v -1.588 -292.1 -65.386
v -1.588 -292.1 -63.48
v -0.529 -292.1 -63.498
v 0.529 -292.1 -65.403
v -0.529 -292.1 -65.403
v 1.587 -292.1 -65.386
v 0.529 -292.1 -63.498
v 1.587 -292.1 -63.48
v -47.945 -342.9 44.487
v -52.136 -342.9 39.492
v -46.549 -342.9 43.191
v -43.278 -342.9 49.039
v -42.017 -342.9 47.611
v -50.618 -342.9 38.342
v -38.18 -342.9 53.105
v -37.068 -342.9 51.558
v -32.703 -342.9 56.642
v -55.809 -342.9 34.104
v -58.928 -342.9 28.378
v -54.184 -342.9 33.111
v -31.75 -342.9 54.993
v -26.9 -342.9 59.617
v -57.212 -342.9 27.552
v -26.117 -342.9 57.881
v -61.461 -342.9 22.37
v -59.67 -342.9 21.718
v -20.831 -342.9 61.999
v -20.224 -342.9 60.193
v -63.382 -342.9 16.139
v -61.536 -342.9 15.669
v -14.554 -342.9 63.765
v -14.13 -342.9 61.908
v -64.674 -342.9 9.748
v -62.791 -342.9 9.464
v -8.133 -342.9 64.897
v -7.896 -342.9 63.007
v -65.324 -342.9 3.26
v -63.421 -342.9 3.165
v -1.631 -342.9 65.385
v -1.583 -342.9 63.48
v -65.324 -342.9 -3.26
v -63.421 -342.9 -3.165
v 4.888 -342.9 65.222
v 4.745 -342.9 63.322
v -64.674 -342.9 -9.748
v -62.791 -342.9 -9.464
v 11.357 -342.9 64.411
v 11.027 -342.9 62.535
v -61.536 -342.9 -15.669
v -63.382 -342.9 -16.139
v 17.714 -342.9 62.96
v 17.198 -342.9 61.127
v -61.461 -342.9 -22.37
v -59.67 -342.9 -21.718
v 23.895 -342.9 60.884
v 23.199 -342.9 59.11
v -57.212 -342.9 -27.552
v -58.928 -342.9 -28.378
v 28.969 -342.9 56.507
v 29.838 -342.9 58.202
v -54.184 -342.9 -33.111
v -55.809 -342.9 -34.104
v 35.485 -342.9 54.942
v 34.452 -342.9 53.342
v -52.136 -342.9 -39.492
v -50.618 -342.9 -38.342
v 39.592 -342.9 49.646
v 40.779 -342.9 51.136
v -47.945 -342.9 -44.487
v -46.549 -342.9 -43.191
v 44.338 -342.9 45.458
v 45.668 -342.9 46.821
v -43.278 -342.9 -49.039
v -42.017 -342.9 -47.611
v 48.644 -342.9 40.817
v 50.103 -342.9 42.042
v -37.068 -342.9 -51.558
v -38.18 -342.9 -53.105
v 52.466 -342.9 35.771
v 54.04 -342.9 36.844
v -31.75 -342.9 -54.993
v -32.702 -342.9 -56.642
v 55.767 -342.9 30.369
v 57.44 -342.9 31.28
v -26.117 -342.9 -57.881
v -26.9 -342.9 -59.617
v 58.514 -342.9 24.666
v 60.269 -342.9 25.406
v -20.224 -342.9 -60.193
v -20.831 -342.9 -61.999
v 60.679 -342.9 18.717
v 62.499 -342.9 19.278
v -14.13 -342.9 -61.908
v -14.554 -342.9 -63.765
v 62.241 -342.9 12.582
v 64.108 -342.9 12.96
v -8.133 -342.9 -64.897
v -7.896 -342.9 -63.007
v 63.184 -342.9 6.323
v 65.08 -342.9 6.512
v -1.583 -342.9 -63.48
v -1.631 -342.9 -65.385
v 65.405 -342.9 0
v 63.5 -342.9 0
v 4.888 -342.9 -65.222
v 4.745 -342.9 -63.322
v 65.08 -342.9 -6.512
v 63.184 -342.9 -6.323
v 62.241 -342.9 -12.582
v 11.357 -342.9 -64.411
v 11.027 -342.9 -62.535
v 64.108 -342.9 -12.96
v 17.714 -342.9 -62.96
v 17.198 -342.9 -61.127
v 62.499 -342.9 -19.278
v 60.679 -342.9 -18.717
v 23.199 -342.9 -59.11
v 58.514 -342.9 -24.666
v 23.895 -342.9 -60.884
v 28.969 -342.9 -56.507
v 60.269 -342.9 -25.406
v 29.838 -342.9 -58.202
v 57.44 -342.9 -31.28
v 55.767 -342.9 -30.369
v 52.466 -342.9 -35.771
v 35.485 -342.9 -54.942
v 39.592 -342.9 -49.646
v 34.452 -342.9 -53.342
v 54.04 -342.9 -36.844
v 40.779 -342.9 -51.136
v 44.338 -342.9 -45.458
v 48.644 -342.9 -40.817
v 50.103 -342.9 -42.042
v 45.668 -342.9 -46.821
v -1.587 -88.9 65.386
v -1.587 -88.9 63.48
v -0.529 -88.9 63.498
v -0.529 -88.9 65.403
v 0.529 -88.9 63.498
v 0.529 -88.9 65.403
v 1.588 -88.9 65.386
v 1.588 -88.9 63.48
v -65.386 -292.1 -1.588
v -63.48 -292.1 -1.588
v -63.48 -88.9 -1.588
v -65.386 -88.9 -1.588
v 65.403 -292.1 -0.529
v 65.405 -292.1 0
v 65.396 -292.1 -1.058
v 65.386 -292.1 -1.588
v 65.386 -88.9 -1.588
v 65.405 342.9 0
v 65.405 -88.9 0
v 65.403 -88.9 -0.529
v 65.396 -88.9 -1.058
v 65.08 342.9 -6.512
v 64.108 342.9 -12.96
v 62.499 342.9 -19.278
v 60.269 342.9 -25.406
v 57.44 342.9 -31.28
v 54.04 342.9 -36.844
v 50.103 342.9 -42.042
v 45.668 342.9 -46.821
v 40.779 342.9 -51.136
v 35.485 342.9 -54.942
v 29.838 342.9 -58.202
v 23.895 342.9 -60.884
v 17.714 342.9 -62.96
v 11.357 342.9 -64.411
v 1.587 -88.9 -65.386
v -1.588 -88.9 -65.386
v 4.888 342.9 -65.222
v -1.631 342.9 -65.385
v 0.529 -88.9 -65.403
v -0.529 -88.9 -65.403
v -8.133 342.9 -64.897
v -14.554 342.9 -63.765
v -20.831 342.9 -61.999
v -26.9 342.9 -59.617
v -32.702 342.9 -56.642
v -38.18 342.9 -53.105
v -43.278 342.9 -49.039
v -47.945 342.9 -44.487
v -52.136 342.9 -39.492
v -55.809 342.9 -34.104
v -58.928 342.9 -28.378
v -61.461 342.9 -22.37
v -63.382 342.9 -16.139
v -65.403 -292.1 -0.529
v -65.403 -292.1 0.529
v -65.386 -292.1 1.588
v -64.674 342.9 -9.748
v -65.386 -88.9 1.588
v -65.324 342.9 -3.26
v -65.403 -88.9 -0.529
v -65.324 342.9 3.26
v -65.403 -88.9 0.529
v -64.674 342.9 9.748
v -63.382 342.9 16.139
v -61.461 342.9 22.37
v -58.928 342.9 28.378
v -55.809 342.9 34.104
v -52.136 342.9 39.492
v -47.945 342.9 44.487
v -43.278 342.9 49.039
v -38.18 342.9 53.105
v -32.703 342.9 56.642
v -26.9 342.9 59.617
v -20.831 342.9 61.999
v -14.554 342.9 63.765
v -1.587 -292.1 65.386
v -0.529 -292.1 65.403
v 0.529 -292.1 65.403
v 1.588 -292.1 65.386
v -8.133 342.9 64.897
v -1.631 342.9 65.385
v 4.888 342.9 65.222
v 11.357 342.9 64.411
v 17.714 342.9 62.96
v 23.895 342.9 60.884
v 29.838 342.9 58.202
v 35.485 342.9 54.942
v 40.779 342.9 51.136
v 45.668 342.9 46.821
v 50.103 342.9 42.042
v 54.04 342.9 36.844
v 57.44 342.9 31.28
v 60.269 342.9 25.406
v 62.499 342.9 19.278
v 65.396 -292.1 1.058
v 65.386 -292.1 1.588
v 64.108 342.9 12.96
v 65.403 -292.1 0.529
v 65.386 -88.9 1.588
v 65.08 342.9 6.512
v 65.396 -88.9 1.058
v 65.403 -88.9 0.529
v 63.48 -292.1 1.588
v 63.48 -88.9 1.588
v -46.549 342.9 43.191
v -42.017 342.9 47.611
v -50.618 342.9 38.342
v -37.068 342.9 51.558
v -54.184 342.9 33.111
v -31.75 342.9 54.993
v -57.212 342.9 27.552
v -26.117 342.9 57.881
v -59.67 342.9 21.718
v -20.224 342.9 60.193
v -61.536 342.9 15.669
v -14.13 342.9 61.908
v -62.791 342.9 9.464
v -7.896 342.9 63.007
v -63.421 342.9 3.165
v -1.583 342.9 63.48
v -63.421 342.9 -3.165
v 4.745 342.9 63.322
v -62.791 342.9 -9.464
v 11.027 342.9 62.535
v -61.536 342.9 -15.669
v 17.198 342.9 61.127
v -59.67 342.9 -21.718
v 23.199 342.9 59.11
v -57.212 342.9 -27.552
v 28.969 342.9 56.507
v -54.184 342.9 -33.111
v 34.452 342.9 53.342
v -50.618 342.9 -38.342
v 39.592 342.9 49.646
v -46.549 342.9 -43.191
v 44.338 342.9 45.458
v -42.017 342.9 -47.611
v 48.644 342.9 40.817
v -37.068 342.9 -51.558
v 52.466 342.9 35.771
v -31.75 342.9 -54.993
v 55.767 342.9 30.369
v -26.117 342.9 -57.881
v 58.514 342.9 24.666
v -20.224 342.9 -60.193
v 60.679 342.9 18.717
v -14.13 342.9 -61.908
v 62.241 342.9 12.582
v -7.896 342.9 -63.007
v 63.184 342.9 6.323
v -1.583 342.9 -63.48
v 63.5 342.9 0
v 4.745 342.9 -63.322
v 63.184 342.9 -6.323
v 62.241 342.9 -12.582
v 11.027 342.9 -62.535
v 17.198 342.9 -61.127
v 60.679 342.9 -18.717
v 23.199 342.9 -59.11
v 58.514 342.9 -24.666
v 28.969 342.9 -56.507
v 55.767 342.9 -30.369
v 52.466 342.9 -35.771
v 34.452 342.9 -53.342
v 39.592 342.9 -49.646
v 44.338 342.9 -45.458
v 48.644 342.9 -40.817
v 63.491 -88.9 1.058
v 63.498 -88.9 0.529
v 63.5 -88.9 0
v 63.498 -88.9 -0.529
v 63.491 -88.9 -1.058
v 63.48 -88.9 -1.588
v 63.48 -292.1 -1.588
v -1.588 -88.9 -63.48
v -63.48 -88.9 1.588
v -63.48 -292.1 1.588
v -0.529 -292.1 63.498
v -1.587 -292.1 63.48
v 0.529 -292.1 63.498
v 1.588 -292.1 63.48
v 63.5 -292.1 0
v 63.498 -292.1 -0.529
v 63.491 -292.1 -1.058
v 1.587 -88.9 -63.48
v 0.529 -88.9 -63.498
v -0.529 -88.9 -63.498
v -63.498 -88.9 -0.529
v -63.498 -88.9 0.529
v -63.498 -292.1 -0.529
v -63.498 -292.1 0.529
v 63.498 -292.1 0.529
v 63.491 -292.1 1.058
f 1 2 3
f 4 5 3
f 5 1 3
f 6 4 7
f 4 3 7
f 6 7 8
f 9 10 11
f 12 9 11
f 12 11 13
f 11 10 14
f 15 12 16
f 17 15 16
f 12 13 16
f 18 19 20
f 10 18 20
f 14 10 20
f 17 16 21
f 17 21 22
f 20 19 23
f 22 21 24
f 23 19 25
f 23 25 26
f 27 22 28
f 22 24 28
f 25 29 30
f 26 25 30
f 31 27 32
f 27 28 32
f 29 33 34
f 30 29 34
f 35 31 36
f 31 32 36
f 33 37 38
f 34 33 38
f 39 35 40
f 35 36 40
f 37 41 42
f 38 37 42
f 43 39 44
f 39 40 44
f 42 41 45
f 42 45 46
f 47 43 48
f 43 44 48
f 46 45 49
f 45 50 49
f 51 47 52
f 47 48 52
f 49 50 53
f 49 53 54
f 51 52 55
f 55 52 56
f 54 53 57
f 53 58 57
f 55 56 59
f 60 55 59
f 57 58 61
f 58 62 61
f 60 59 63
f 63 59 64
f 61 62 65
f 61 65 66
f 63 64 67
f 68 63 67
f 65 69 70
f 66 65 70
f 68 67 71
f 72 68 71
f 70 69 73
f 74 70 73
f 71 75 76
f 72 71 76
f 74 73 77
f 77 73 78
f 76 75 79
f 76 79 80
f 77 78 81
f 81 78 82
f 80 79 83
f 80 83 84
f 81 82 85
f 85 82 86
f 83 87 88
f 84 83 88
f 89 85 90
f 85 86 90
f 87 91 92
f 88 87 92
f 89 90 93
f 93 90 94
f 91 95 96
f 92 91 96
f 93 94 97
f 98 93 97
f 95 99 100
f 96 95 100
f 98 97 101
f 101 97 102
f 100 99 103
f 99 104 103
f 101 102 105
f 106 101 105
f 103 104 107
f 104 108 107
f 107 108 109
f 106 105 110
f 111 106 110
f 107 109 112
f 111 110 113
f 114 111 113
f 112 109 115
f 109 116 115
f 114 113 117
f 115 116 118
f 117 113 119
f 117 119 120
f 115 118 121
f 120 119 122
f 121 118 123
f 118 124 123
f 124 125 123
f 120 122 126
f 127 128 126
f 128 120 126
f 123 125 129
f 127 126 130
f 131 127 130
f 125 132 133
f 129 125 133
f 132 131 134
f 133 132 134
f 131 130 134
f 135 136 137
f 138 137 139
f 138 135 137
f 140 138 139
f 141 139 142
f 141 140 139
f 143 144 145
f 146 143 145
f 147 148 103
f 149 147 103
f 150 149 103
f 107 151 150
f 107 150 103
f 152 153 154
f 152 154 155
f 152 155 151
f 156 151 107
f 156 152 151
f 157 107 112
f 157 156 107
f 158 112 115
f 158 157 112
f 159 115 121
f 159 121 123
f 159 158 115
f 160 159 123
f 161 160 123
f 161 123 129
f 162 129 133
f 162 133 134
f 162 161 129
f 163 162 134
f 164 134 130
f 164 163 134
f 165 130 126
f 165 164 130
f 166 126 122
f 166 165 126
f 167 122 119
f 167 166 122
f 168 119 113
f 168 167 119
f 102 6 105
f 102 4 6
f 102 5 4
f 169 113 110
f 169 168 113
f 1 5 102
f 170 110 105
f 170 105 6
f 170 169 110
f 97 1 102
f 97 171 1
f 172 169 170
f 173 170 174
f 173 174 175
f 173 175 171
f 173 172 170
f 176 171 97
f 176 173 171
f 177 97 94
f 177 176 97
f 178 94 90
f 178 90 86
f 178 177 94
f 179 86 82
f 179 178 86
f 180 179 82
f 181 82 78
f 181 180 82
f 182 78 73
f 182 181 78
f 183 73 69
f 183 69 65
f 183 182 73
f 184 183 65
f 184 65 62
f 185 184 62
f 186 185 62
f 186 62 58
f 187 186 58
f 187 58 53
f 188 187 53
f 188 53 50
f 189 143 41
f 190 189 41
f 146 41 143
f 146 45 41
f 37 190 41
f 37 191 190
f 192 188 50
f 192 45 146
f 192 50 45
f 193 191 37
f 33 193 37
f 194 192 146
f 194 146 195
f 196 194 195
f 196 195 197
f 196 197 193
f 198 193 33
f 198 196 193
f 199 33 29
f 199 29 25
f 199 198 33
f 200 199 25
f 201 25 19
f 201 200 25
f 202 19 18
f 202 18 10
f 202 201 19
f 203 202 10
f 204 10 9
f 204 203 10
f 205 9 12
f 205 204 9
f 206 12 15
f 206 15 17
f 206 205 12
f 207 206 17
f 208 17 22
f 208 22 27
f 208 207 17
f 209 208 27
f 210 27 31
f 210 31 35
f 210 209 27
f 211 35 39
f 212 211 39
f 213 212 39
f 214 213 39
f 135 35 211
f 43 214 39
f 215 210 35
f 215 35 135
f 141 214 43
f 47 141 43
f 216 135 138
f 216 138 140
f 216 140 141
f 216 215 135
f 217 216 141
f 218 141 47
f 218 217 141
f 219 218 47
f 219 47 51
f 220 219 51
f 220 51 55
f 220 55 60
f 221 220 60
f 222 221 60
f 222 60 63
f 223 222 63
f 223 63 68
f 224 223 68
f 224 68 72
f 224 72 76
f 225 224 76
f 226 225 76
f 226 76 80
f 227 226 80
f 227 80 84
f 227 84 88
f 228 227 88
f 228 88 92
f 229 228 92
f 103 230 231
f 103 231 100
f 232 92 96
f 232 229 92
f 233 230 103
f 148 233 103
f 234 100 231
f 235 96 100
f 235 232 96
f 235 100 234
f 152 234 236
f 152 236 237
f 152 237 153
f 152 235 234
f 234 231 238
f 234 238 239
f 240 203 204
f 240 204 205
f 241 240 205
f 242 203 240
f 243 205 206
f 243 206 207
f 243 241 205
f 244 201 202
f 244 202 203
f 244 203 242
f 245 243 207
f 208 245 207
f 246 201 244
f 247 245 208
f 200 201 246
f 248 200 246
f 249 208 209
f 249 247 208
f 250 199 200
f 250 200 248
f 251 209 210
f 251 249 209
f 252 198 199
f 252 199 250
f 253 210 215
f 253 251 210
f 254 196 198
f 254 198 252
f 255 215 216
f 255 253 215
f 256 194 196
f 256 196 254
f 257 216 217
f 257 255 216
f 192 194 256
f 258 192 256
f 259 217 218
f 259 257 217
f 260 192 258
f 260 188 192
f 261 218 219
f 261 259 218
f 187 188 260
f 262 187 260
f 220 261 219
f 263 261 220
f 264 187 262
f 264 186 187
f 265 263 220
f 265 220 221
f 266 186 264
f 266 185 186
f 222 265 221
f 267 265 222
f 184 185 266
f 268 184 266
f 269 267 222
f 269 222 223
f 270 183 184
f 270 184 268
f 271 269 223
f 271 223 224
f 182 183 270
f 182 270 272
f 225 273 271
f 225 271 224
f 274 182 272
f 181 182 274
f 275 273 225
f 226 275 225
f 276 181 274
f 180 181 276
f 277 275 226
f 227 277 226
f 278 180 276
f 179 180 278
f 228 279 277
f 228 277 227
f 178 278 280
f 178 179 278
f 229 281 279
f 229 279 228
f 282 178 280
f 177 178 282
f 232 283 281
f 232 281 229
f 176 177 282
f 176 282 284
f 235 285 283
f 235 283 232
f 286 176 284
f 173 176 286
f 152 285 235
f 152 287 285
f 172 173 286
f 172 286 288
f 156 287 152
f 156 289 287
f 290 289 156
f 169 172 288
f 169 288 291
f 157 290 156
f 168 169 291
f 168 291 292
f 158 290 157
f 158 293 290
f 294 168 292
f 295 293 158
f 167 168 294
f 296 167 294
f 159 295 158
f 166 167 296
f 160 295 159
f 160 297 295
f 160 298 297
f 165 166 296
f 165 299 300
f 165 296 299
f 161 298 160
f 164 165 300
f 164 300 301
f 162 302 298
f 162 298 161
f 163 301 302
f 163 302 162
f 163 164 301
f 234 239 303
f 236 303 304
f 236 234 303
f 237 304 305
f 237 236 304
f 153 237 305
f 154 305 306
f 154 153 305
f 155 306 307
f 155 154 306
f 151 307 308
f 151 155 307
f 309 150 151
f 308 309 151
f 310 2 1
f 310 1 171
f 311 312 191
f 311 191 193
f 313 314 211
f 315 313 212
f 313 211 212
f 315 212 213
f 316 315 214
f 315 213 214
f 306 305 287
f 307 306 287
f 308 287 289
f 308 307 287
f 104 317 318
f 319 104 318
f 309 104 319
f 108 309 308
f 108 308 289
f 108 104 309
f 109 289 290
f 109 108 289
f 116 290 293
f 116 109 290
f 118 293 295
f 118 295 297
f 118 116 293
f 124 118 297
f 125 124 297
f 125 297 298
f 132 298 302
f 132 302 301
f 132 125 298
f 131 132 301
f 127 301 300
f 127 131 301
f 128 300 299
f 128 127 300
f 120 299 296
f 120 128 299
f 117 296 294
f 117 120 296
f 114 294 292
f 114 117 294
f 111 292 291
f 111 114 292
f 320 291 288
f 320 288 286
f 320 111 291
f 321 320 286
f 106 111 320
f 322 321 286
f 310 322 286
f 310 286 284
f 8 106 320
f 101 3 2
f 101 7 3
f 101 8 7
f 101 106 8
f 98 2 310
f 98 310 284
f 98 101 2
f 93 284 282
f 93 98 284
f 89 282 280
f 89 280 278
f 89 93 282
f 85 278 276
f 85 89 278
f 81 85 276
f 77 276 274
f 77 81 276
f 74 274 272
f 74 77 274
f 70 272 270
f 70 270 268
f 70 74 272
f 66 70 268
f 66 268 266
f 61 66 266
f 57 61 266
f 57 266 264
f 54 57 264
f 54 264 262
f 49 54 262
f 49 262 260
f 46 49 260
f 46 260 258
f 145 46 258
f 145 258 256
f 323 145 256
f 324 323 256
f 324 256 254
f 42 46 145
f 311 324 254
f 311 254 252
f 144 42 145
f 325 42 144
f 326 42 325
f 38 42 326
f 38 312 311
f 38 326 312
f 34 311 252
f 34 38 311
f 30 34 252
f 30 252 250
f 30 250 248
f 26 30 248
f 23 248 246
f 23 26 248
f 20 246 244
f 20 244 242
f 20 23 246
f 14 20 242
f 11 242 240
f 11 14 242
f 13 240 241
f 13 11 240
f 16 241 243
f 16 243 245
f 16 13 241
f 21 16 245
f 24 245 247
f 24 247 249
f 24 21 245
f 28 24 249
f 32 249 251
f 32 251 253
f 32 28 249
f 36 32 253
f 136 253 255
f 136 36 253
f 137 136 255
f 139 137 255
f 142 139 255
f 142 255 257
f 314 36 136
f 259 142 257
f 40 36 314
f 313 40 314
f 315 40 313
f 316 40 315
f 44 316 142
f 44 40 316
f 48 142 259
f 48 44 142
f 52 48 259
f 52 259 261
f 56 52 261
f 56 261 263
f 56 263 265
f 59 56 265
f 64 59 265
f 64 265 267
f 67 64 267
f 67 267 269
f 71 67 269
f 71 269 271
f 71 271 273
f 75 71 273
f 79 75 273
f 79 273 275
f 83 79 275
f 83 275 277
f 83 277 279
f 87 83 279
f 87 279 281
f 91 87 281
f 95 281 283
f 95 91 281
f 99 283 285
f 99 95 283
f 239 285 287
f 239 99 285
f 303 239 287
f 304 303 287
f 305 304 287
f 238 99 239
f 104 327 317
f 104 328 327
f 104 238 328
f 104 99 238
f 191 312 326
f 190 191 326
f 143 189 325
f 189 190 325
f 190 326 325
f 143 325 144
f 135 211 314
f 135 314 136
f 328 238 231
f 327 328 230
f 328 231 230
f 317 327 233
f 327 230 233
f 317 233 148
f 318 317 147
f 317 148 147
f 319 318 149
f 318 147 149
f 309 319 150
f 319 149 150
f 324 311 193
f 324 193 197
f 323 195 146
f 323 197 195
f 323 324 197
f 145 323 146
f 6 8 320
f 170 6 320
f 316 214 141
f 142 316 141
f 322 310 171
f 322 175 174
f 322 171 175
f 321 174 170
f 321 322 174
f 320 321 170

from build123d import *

# Parameters (mm, degrees)
SKETCH1_R           = 65.405
SKETCH1_R_2         = 63.5
BOSS_EXTRUDE1_DEPTH = 342.9
SKETCH4_W           = 3.175
SKETCH4_H           = 203.2
CUT_EXTRUDE2_DEPTH  = 66.405
CIRPATTERN4_COUNT   = 2
CIRPATTERN4_ANGLE   = 90


with BuildPart() as part:
    # Sketch1 → Boss-Extrude1 (new body, symmetric)
    with BuildSketch(Plane(origin=(0, 0, 0), x_dir=(1, 0, 0), z_dir=(0, 1, 0))):
        Circle(SKETCH1_R)
        Circle(SKETCH1_R_2, mode=Mode.SUBTRACT)
    extrude(amount=BOSS_EXTRUDE1_DEPTH, both=True)

    # Sketch4 → Cut-Extrude2 (cut, symmetric)
    with BuildSketch(Plane(origin=(0, 0, 0), x_dir=(0, 0, -1), z_dir=(1, 0, 0))):
        with Locations((0, -190.5)):
            Rectangle(SKETCH4_W, SKETCH4_H)
    cut_extrude2 = extrude(amount=CUT_EXTRUDE2_DEPTH, both=True, mode=Mode.SUBTRACT)

    # CirPattern4: Cut-Extrude2 ×2 about axis
    cirpattern4_axis = Axis((0, 342.9, 0), (0, -1, 0))
    for i in range(1, CIRPATTERN4_COUNT):
        add(cut_extrude2.rotate(cirpattern4_axis, i * CIRPATTERN4_ANGLE / (CIRPATTERN4_COUNT - 1)), mode=Mode.SUBTRACT)


solid = part.part
